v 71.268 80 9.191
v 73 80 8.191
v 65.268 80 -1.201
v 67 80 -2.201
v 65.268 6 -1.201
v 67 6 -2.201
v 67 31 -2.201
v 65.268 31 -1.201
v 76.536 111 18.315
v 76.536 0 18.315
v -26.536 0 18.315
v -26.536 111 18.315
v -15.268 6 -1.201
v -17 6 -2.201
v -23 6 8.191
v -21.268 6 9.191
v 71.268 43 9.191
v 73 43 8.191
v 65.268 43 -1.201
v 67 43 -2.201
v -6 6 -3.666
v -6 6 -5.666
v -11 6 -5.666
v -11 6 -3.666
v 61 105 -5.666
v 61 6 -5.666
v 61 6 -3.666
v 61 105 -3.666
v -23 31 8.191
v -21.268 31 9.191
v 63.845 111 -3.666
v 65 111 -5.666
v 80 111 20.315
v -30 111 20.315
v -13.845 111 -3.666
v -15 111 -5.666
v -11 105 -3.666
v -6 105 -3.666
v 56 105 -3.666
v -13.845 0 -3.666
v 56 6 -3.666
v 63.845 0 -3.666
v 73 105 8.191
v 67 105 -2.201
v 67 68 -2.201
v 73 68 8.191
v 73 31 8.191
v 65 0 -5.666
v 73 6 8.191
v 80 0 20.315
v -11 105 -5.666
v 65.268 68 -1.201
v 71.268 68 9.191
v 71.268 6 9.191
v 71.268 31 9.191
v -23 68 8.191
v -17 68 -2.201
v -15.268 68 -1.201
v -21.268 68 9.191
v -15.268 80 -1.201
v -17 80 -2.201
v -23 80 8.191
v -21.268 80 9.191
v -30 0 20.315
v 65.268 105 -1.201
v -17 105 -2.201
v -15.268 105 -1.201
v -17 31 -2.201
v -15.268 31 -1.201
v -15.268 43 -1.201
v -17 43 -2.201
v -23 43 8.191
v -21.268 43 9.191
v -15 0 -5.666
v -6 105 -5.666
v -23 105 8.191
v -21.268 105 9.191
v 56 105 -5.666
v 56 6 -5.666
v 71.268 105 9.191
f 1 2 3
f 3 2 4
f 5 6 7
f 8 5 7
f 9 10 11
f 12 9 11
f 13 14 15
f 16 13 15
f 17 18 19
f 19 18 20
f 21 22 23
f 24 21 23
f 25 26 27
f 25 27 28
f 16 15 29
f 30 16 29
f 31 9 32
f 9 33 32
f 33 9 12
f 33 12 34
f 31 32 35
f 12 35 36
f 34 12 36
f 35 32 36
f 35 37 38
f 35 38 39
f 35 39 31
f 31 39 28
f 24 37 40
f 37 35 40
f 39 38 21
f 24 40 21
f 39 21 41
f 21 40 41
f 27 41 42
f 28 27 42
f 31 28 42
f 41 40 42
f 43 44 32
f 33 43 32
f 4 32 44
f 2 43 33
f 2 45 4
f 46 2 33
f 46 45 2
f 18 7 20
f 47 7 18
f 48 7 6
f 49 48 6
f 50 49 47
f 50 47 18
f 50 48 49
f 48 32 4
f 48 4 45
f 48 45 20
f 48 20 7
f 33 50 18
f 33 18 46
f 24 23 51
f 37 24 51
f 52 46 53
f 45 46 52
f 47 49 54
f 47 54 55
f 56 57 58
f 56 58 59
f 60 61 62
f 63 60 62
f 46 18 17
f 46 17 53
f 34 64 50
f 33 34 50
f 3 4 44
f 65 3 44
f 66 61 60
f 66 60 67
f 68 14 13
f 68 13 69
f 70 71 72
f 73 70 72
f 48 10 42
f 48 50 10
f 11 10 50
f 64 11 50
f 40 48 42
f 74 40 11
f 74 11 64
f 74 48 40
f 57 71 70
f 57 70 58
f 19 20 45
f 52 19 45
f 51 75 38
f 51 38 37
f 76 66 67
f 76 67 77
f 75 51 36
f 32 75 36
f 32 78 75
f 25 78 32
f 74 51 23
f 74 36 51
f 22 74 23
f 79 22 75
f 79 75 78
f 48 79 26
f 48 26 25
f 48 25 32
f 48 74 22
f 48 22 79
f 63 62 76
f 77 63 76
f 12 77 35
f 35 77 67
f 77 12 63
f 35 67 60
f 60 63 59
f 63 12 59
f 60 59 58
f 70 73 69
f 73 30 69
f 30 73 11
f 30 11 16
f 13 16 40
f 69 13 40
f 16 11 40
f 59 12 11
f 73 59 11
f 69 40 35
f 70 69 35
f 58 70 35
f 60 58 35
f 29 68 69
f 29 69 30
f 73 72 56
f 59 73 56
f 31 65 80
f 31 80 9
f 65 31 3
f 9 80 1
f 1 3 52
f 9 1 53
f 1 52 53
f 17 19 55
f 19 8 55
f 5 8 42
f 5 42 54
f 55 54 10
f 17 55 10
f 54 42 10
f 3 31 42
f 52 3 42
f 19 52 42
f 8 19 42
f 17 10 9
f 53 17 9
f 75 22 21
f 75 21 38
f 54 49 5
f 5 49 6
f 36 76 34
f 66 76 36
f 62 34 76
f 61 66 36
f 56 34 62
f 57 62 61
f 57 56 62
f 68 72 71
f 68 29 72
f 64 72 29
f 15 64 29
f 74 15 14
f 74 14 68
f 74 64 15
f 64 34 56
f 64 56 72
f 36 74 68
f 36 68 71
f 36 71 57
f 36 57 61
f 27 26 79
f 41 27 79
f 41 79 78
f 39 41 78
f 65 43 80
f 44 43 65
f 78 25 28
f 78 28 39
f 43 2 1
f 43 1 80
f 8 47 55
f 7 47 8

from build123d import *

# Parameters (mm, degrees)
EXTRUDE_1_DEPTH     = 111
SKETCH_3_W          = 12
SKETCH_3_H          = 25
CUT_EXTRUDE_1_DEPTH = 2
SKETCH_5_W          = 12
SKETCH_5_H          = 25
CUT_EXTRUDE_2_DEPTH = 2
SKETCH_6_W          = 5
SKETCH_6_H          = 99
CUT_EXTRUDE_3_DEPTH = 2


with BuildPart() as part:
    # 草圖1 → 填料-伸長1 (new body)
    with BuildSketch(Plane(origin=(0, 0, 0), x_dir=(1, 0, 0), z_dir=(0, 1, 0))):
        Polygon((-15, 5.665584657), (65, 5.665584657), (80, -20.315177457), (65, -20.315177457), (-15, -20.315177457), (-30, -20.315177457), align=None)
        Polygon((-13.845299462, 3.665584657), (63.845299462, 3.665584657), (76.535898385, -18.315177457), (65, -18.315177457), (-15, -18.315177457), (-26.535898385, -18.315177457), align=None, mode=Mode.SUBTRACT)
    extrude(amount=EXTRUDE_1_DEPTH)

    # 草圖3 → 除料-伸長1 (cut)
    with BuildSketch(Plane(origin=(51.20327012, 0, -29.562221787), x_dir=(-0.5, 0, -0.866025404), z_dir=(0.866025404, 0, -0.5))):
        with Locations((-37.59345976, 92.5)):
            Rectangle(SKETCH_3_W, SKETCH_3_H)
        with Locations((-37.59345976, 55.5)):
            Rectangle(SKETCH_3_W, SKETCH_3_H)
        with Locations((-37.59345976, 18.5)):
            Rectangle(SKETCH_3_W, SKETCH_3_H)
    extrude(amount=-CUT_EXTRUDE_1_DEPTH, mode=Mode.SUBTRACT)

    # 草圖5 → 除料-伸長2 (cut)
    with BuildSketch(Plane(origin=(-13.70327012, 0, -7.911586693), x_dir=(-0.5, 0, 0.866025404), z_dir=(-0.866025404, 0, -0.5))):
        with Locations((12.59345976, 92.5)):
            Rectangle(SKETCH_5_W, SKETCH_5_H)
        with Locations((12.59345976, 55.5)):
            Rectangle(SKETCH_5_W, SKETCH_5_H)
        with Locations((12.59345976, 18.5)):
            Rectangle(SKETCH_5_W, SKETCH_5_H)
    extrude(amount=-CUT_EXTRUDE_2_DEPTH, mode=Mode.SUBTRACT)

    # 草圖6 → 除料-伸長3 (cut)
    with BuildSketch(Plane(origin=(0, 0, -5.665584657), x_dir=(-1, 0, 0), z_dir=(0, 0, -1))):
        with Locations((-58.5, 55.5)):
            Rectangle(SKETCH_6_W, SKETCH_6_H)
        with Locations((8.5, 55.5)):
            Rectangle(SKETCH_6_W, SKETCH_6_H)
    extrude(amount=-CUT_EXTRUDE_3_DEPTH, mode=Mode.SUBTRACT)


solid = part.part
